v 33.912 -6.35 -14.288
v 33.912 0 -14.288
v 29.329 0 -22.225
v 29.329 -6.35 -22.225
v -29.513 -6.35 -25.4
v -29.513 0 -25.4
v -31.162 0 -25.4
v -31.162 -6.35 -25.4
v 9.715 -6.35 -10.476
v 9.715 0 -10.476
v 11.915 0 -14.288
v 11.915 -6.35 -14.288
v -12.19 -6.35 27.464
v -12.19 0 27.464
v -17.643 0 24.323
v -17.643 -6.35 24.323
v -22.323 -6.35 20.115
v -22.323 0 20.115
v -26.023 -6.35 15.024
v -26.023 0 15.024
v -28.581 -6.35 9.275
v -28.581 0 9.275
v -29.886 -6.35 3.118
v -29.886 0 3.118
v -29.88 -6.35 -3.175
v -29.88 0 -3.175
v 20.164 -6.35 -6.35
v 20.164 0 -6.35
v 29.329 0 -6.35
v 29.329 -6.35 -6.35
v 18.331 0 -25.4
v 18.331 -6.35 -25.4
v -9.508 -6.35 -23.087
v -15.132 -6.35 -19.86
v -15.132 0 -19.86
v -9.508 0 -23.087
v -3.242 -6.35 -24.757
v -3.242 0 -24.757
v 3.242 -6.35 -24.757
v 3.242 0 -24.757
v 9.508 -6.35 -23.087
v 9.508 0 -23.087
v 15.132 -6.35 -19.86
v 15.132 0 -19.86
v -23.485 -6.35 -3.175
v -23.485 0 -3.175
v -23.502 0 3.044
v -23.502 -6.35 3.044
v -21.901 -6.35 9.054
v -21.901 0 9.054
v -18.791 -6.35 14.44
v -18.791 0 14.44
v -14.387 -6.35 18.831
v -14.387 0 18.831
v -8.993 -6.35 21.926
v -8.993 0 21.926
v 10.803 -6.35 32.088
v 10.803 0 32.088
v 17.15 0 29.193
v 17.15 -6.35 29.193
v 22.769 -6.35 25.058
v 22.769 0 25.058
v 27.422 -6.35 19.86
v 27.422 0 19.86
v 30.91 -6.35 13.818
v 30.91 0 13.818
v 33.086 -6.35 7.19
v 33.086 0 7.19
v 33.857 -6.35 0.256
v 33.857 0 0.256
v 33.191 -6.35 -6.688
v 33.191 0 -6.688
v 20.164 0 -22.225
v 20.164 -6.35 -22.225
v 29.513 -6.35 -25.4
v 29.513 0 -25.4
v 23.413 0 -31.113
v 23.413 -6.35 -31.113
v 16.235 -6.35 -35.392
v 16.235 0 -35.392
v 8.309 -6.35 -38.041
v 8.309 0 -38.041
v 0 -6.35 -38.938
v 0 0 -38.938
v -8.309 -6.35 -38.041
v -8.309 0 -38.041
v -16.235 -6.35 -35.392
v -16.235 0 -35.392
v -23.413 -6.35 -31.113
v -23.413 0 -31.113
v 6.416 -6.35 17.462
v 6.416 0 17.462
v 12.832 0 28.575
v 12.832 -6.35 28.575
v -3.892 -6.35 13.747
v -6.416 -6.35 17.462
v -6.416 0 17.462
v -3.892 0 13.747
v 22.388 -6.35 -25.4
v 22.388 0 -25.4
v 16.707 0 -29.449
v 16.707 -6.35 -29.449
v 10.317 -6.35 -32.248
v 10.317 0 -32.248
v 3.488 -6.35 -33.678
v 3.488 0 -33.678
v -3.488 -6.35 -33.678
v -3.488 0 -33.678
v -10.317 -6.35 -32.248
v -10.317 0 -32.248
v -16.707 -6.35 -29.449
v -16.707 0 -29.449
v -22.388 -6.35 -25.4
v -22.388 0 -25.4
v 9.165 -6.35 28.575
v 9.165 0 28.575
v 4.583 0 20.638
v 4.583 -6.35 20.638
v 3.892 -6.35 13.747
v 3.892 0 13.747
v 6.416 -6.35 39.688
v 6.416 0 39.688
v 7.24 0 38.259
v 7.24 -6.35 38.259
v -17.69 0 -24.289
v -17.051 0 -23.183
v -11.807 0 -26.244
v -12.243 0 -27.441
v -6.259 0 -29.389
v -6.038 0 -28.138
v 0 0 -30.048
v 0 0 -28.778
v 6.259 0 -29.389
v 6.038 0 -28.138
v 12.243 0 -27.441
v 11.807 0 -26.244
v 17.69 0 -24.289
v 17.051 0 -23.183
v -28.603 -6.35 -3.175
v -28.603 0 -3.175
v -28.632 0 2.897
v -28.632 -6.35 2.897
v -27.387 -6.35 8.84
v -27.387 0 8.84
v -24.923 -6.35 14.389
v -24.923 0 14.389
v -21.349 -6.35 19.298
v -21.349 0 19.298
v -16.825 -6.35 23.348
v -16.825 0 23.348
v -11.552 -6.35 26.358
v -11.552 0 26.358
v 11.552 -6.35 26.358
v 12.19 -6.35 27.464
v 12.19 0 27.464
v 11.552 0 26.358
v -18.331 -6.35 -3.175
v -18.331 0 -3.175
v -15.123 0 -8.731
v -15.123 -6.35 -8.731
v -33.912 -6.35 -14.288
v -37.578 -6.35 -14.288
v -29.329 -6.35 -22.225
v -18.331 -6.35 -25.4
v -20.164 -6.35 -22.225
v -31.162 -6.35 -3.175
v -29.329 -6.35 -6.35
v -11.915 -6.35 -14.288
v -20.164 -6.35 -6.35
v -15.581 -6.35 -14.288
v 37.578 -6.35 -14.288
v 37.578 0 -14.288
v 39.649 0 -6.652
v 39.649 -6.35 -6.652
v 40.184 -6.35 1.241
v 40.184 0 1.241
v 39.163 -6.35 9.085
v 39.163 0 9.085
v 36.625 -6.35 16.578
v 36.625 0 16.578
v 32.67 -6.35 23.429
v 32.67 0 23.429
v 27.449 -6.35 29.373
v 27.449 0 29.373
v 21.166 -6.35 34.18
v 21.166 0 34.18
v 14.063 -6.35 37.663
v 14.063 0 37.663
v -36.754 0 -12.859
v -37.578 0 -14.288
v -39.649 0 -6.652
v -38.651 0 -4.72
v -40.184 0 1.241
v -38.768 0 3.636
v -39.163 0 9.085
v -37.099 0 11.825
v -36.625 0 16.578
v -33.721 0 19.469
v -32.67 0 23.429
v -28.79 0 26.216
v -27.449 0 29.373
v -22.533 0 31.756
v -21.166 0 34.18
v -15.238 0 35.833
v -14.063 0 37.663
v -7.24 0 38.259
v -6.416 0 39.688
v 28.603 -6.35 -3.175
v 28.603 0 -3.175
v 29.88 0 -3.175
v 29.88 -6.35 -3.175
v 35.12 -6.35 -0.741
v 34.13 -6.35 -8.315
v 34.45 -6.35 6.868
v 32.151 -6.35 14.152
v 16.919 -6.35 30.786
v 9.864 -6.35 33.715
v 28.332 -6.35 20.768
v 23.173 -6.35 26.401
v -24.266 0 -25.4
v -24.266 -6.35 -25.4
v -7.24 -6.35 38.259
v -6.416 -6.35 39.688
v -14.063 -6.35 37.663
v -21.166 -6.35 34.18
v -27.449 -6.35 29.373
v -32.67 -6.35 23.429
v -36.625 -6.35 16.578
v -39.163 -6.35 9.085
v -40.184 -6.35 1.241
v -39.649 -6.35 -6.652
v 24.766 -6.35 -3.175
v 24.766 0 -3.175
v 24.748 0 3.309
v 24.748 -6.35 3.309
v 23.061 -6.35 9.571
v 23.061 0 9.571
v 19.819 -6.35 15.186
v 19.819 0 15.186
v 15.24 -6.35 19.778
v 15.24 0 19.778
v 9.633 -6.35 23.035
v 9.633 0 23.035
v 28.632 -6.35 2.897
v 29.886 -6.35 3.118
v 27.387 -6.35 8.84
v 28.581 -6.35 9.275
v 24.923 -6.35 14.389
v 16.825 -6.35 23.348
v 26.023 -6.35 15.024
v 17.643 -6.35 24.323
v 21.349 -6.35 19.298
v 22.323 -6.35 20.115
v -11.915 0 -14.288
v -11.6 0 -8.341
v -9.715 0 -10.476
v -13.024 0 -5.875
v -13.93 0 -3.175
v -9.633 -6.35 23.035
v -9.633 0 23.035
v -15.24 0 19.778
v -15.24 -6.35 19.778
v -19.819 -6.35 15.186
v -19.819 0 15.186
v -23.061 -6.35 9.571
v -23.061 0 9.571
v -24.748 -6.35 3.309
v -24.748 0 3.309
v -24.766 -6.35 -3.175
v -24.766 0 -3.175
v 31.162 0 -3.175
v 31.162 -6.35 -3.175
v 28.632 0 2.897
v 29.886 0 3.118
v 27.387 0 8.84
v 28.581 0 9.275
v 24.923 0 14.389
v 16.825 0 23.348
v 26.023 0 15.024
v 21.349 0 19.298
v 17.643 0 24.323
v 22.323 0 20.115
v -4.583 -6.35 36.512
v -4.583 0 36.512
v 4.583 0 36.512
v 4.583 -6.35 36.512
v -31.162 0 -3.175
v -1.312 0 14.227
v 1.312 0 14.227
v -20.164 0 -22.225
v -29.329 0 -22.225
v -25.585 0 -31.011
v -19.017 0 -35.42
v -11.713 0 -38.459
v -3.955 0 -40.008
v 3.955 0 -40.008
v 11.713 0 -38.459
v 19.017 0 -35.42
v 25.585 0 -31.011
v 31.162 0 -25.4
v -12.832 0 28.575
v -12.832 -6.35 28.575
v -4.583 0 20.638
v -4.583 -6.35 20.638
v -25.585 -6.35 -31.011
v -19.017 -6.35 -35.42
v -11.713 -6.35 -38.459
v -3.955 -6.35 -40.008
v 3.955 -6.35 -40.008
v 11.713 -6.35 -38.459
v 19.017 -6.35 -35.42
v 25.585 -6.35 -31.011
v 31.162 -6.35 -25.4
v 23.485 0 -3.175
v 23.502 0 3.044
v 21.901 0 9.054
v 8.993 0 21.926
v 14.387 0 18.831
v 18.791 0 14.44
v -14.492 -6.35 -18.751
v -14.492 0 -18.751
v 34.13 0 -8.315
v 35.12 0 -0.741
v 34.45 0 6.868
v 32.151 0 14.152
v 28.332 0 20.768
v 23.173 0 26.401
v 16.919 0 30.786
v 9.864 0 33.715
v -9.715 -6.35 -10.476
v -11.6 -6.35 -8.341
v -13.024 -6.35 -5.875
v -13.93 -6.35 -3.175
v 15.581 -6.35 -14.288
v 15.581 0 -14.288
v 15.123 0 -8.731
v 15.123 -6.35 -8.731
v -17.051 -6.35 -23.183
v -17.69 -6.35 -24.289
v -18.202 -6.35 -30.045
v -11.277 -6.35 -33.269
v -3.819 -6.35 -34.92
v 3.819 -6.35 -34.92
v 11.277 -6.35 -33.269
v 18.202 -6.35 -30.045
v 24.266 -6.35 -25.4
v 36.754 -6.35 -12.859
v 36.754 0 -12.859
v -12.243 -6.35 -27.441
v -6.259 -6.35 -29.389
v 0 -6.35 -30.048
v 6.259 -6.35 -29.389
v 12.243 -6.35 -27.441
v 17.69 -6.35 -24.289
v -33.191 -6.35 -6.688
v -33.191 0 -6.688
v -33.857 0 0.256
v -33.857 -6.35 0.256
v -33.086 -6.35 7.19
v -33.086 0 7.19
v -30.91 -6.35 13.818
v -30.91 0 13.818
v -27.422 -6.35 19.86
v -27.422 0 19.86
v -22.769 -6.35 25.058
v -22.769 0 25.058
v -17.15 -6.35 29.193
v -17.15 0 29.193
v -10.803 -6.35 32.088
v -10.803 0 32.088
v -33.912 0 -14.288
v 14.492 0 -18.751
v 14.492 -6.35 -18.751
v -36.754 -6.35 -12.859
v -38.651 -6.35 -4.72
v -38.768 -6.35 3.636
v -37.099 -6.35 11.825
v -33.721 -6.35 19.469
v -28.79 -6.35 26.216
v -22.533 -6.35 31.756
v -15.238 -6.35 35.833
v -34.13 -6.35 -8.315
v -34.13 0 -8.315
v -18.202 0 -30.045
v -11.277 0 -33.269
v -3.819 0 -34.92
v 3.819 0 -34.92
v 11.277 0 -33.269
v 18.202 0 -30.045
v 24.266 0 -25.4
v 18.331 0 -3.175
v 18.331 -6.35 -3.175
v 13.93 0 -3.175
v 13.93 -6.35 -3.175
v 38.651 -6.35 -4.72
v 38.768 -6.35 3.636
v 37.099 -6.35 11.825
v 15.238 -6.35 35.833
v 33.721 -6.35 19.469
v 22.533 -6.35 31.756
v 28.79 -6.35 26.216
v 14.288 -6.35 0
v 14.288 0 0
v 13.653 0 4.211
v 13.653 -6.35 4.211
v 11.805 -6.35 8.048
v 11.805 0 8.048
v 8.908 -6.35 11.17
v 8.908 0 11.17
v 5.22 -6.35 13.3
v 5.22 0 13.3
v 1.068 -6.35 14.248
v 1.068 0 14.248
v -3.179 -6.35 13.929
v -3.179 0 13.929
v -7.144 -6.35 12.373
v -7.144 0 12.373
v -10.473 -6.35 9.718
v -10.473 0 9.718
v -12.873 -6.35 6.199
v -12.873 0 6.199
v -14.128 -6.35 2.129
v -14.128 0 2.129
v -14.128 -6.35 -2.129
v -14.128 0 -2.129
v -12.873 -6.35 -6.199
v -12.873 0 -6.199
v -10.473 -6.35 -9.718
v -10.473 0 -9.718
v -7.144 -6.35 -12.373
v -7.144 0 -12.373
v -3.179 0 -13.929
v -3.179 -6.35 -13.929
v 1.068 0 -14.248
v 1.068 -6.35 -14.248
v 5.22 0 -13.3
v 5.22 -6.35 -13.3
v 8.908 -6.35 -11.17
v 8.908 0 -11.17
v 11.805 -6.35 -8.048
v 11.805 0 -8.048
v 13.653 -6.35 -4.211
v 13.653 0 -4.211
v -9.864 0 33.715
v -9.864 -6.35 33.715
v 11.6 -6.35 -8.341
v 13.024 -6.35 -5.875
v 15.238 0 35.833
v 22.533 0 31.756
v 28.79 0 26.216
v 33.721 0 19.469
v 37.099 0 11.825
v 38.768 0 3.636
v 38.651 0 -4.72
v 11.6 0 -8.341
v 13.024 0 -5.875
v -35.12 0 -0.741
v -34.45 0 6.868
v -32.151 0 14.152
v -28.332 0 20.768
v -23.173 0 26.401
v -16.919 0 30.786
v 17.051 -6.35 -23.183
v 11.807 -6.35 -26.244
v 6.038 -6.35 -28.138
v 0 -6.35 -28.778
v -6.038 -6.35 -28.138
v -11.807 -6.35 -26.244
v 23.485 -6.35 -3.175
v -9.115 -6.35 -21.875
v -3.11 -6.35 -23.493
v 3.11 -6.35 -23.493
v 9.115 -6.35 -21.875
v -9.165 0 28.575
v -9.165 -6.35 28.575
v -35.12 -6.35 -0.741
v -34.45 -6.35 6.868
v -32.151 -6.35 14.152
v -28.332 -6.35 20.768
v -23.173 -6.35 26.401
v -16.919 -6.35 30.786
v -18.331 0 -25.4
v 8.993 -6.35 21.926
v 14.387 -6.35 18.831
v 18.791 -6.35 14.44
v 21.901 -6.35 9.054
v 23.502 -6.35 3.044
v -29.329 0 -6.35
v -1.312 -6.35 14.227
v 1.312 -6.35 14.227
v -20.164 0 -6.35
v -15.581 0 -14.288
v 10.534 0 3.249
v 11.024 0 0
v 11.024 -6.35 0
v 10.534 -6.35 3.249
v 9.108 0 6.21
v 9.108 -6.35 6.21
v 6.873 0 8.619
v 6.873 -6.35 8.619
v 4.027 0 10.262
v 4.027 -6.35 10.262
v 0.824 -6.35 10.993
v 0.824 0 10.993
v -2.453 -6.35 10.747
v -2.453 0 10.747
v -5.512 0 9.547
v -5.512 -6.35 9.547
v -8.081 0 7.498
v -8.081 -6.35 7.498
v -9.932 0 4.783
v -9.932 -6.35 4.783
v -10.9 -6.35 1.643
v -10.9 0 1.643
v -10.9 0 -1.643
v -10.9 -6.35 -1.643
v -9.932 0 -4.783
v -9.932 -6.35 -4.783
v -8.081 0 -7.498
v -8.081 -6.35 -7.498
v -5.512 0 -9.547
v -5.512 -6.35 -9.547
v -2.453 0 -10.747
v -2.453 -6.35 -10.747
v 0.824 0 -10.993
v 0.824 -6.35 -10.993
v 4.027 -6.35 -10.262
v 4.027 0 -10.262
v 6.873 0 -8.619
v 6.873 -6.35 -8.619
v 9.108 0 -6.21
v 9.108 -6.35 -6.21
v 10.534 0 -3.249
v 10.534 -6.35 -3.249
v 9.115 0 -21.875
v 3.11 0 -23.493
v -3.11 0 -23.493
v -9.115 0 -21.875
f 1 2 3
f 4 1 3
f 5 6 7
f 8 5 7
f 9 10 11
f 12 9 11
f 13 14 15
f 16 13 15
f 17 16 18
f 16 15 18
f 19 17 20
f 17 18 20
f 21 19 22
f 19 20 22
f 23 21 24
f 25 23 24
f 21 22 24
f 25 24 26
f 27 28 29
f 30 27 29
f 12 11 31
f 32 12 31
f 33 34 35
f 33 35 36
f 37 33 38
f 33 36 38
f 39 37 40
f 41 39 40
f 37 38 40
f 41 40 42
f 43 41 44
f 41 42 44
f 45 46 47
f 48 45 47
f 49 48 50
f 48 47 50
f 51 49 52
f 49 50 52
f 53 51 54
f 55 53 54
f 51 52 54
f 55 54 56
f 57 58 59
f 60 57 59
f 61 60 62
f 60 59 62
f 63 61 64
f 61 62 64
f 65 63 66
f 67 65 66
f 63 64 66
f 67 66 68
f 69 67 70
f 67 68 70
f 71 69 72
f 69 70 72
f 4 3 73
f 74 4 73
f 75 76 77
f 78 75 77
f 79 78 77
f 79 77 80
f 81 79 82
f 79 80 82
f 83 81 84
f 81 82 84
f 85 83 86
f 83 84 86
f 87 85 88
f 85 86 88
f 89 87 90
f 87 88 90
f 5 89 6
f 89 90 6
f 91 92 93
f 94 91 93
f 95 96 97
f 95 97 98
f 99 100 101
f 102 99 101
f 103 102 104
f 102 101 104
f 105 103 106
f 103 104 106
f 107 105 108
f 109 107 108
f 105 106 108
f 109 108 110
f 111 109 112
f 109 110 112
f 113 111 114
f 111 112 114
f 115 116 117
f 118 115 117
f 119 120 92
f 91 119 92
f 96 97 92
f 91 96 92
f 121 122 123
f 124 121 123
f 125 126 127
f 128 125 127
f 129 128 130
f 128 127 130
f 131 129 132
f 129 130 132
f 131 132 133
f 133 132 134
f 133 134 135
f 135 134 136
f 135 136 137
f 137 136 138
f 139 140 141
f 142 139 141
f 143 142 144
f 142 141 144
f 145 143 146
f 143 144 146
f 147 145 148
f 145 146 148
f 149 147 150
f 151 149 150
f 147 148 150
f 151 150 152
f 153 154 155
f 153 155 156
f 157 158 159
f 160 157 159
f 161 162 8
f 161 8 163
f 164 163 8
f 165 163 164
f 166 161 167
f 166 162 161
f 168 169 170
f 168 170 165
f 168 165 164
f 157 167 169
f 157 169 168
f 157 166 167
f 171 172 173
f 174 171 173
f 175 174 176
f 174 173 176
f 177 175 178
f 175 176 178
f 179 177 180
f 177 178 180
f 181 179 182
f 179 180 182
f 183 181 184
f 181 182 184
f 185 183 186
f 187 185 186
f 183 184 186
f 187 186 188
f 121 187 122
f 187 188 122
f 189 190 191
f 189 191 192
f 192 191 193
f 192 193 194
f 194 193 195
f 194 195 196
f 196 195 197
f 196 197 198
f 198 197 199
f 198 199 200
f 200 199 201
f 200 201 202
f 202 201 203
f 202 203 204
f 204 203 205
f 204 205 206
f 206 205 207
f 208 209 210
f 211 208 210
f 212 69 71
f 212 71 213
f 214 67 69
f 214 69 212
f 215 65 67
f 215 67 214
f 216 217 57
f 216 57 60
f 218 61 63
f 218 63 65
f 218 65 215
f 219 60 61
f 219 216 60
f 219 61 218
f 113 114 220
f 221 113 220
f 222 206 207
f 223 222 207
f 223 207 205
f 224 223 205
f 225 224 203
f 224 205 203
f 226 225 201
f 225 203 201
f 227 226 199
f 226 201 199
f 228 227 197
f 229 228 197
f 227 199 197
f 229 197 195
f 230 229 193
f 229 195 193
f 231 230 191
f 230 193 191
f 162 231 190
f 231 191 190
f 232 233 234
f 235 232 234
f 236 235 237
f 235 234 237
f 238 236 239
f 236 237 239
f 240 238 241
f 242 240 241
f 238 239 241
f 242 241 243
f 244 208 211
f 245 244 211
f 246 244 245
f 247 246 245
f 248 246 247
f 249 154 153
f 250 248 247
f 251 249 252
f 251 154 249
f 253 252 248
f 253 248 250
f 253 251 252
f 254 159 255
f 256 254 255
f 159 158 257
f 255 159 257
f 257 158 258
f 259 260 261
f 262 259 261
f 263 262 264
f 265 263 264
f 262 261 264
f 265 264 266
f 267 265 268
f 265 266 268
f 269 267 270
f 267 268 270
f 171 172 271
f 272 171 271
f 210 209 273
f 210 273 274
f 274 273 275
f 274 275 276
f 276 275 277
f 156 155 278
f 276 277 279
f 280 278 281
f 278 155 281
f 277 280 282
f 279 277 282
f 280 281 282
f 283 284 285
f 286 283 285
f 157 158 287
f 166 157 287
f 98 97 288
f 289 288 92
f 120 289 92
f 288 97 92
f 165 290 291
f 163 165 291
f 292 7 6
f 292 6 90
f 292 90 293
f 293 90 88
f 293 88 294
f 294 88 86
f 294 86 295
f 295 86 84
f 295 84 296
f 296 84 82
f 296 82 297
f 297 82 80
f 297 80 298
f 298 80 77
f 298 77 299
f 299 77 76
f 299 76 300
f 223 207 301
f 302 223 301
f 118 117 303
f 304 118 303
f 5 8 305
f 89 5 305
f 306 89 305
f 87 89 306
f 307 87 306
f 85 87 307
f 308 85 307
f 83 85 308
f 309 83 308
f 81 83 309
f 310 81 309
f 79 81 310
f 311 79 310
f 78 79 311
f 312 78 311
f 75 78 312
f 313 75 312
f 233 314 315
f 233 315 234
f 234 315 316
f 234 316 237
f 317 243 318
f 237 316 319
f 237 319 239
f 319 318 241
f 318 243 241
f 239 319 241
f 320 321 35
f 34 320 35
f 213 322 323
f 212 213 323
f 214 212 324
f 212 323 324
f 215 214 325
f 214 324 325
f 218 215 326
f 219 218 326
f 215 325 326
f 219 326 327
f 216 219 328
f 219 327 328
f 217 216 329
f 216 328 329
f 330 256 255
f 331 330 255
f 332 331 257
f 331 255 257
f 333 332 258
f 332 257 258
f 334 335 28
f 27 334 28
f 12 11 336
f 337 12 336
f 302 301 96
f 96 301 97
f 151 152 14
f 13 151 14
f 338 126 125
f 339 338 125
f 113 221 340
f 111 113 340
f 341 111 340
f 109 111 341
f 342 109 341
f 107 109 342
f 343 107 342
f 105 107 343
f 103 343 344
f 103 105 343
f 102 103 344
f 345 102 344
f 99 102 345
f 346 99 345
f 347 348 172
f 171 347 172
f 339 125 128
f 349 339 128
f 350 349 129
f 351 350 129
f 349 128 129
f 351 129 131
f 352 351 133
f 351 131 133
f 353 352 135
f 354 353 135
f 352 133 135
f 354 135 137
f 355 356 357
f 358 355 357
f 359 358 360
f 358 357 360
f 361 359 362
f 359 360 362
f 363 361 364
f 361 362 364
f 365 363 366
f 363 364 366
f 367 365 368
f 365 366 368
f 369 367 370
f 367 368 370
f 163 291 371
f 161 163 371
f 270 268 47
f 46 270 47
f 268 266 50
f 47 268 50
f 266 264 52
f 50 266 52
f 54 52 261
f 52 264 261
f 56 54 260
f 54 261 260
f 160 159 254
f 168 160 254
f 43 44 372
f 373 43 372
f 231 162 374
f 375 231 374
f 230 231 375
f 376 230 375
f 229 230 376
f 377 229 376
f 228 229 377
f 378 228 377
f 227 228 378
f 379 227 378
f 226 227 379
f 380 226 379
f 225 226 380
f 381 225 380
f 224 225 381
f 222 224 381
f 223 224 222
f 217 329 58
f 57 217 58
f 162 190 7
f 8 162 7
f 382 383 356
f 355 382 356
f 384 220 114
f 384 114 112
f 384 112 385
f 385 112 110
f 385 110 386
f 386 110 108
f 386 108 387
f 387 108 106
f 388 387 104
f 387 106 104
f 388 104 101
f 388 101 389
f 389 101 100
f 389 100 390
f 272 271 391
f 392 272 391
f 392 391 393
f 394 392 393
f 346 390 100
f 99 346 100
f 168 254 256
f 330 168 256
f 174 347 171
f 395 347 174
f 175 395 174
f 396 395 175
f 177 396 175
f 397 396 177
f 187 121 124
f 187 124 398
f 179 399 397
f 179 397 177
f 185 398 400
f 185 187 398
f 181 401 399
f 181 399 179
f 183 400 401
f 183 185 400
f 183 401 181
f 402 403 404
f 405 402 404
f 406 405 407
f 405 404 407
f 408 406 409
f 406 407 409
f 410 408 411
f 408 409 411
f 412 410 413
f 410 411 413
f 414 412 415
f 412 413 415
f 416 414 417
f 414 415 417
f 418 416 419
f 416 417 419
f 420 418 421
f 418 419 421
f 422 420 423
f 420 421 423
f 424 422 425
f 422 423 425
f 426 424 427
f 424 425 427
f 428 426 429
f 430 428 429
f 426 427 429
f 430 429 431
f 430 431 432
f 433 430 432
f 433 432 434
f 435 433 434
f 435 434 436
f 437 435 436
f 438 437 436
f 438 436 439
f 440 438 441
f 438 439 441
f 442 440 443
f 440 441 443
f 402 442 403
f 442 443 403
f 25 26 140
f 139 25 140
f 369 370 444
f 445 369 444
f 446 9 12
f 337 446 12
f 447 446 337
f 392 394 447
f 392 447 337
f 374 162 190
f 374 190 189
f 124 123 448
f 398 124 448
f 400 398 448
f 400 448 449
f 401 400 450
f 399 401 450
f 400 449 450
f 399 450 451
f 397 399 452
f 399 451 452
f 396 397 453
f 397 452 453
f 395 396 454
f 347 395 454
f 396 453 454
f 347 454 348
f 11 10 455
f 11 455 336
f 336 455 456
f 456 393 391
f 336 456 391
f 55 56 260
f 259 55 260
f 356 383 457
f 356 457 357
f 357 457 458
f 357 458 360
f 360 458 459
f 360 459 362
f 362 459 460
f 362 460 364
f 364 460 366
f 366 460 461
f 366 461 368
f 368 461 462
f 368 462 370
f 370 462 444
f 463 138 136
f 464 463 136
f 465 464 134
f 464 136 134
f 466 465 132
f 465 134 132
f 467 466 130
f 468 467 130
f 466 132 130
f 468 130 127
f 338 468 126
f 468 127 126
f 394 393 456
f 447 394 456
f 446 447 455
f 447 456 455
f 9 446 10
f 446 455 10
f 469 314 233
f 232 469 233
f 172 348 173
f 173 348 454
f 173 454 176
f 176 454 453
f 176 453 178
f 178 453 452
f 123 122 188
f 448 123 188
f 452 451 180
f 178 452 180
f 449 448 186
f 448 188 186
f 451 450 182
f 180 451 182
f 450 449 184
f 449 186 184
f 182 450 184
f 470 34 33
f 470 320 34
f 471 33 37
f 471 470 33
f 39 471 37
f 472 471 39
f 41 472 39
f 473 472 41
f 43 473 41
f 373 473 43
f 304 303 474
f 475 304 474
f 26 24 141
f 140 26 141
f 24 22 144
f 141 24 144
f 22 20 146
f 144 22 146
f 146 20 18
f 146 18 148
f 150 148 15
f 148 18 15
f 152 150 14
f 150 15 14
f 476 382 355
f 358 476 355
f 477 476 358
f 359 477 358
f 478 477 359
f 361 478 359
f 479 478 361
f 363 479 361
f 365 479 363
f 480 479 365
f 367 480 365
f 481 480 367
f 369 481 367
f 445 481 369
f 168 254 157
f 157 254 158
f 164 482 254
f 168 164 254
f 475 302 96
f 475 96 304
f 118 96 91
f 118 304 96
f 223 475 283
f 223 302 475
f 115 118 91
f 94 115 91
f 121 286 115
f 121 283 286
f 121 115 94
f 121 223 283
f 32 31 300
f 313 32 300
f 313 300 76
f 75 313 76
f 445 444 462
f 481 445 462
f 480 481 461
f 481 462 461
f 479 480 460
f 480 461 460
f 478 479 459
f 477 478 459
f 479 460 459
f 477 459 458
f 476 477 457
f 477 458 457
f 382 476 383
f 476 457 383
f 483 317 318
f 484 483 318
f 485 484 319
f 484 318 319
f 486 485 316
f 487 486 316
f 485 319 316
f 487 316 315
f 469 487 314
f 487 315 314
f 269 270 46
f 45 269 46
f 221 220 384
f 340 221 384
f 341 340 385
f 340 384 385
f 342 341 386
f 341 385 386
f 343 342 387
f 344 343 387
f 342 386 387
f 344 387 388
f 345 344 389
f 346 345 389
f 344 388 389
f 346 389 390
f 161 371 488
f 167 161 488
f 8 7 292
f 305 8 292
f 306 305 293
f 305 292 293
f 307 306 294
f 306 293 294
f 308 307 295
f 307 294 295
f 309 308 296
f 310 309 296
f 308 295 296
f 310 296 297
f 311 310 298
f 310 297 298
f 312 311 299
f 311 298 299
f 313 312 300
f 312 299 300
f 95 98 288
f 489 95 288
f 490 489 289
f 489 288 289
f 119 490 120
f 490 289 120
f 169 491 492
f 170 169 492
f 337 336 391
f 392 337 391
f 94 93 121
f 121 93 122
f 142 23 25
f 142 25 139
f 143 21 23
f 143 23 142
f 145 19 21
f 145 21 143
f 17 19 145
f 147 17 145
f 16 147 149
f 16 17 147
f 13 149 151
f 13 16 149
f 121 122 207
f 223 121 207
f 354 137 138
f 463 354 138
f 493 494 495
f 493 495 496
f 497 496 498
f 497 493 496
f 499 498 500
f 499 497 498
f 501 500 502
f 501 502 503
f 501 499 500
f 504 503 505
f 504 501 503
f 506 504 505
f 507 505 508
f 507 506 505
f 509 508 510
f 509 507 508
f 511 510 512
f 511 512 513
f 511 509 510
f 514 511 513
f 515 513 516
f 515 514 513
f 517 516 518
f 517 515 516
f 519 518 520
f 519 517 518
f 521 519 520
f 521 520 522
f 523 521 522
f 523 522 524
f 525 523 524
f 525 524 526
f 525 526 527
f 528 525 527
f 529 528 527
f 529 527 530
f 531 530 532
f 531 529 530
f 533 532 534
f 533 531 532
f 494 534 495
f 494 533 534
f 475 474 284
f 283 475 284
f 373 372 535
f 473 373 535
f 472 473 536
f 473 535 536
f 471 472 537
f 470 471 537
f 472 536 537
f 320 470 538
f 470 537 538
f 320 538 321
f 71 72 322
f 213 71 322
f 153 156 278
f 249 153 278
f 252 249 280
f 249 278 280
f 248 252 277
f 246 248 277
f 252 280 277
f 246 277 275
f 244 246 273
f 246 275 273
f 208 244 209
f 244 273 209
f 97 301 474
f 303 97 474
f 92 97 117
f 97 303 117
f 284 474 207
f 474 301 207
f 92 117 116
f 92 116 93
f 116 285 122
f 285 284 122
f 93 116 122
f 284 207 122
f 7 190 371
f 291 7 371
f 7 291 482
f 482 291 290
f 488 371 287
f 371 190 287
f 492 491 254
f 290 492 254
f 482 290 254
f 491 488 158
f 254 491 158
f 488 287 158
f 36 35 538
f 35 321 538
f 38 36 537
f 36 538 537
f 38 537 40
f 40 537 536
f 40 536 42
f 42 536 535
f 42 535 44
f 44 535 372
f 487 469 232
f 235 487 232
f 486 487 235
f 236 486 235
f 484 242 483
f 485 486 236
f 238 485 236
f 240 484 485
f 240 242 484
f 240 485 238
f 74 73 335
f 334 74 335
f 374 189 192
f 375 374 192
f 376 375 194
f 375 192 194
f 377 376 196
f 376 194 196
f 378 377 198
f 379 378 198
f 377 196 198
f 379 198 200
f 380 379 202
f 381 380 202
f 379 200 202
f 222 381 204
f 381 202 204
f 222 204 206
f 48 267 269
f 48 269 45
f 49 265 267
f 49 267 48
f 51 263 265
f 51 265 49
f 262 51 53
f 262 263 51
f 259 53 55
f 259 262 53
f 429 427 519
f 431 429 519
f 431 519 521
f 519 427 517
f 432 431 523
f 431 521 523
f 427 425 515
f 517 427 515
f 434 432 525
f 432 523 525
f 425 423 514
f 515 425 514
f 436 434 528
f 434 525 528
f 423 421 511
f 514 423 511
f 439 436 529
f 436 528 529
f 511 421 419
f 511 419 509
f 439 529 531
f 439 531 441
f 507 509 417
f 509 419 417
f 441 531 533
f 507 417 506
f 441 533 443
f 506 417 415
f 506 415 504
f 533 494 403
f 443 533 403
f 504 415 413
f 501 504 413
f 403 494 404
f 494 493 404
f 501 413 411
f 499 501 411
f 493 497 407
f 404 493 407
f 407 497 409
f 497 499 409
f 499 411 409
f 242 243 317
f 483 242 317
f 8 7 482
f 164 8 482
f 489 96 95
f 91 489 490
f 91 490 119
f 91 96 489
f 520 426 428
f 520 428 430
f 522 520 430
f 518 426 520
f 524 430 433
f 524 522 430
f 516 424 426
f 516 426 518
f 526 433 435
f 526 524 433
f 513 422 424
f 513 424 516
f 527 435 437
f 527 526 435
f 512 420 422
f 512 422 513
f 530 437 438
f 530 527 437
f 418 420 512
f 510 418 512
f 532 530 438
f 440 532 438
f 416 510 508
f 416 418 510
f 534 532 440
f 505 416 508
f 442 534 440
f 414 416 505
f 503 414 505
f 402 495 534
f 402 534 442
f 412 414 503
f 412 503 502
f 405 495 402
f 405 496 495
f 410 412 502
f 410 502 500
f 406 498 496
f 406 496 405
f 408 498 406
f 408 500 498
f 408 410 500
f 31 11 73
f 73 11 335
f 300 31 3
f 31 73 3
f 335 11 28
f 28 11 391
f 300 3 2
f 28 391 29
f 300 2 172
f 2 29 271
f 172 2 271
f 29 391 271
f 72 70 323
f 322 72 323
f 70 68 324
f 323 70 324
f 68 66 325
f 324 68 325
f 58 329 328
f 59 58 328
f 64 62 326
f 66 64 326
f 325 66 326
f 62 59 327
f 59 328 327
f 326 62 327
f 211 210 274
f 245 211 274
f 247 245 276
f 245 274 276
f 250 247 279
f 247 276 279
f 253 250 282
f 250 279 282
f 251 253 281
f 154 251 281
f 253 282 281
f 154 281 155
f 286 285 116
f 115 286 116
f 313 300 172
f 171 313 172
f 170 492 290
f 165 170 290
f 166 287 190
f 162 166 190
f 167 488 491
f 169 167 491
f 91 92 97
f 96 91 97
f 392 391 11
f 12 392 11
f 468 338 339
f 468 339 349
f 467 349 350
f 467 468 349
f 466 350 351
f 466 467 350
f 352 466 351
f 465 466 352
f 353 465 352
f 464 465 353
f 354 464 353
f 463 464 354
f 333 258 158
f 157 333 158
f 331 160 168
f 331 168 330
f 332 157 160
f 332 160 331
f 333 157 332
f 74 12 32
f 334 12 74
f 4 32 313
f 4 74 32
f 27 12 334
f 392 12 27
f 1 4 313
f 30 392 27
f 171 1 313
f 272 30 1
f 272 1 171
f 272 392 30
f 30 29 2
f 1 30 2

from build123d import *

# Parameters (mm, degrees)
F0_R     = 14.2875
F0_R_2   = 11.0236
F2_DEPTH = 6.35


# Not quite as in the source:
# - ends of sketch curves that miss each other by under 0.0002 mm in the source are joined


with BuildPart() as f2:
    # F0 (on Front) → F2 (new body)
    with BuildSketch(Plane.XZ):
        Circle(F0_R)
        Circle(F0_R_2, mode=Mode.SUBTRACT)
    extrude(amount=F2_DEPTH)


with BuildPart() as f2b:
    # F0 (on Front) → F2, piece 2 (new body)
    with BuildSketch(Plane.XZ):
        Polygon((-6.4158048664, 17.4625), (6.4158048664, 17.4625), (12.8316097327, 28.575), (6.4158048664, 39.6875), (-6.4158048664, 39.6875), (-12.8316097327, 28.575), align=None)
        Polygon((9.1654355234, 28.575), (4.5827177617, 20.6375), (-4.5827177617, 20.6375), (-9.1654355234, 28.575), (-4.5827177617, 36.5125), (4.5827177617, 36.5125), align=None, mode=Mode.SUBTRACT)
    extrude(amount=F2_DEPTH)


with BuildPart() as f2c:
    # F0 (on Front) → F2, piece 3 (new body)
    with BuildSketch(Plane.XZ):
        Polygon((-31.1624807795, -25.4), (-18.3308710468, -25.4), (-11.9150661804, -14.2875), (-18.3308710468, -3.175), (-31.1624807795, -3.175), (-37.5782856459, -14.2875), align=None)
        Polygon((-33.9121114365, -14.2875), (-29.3293936748, -6.35), (-20.1639581514, -6.35), (-15.5812403898, -14.2875), (-20.1639581514, -22.225), (-29.3293936748, -22.225), align=None, mode=Mode.SUBTRACT)
    extrude(amount=F2_DEPTH)


with BuildPart() as f2d:
    # F0 (on Front) → F2, piece 4 (new body)
    with BuildSketch(Plane.XZ):
        Polygon((37.5782856459, -14.2875), (31.1624807795, -3.175), (18.3308710468, -3.175), (11.9150661804, -14.2875), (18.3308710468, -25.4), (31.1624807795, -25.4), align=None)
        Polygon((29.3293936748, -22.225), (20.1639581514, -22.225), (15.5812403898, -14.2875), (20.1639581514, -6.35), (29.3293936748, -6.35), (33.9121114365, -14.2875), align=None, mode=Mode.SUBTRACT)
    extrude(amount=F2_DEPTH)


with BuildPart() as f2e:
    # F1 (on Front) → F2, piece 5 (new body)
    with BuildSketch(Plane.XZ):
        with BuildLine():
            ThreePointArc((-36.7535982008, -12.8590994448), (-33.7214703776, 19.4691), (-7.2404923114, 38.2590994448))
            Line((-7.2404923114, 38.2590994448), (-6.4158048664, 39.6875))
            ThreePointArc((-6.4158048664, 39.6875), (-34.8165931166, 20.1013694082), (-37.5782856459, -14.2875))
            Line((-37.5782856459, -14.2875), (-36.7535982008, -12.8590994448))
        make_face()
    extrude(amount=F2_DEPTH)


with BuildPart() as f2f:
    # F1 (on Front) → F2, piece 6 (new body)
    with BuildSketch(Plane.XZ):
        with BuildLine():
            Line((-10.8030992669, 32.0884831905), (-9.8641309809, 33.7148239686))
            ThreePointArc((-9.8641309809, 33.7148239686), (-30.4219135892, 17.5641), (-34.1299595314, -8.3148239686))
            Line((-34.1299595314, -8.3148239686), (-33.1909912454, -6.6884831905))
            ThreePointArc((-33.1909912454, -6.6884831905), (-29.3220613264, 16.9291), (-10.8030992669, 32.0884831905))
        make_face()
    extrude(amount=F2_DEPTH)


with BuildPart() as f2g:
    # F1 (on Front) → F2, piece 7 (new body)
    with BuildSketch(Plane.XZ):
        with BuildLine():
            ThreePointArc((-9.6331085014, 23.0350652667), (-21.6230914657, 12.4841069647), (-24.7655079948, -3.175))
            Line((-24.7655079948, -3.175), (-23.4845493514, -3.175))
            ThreePointArc((-23.4845493514, -3.175), (-20.523243224, 11.8491), (-8.9926440187, 21.9257163348))
            Line((-8.9926440187, 21.9257163348), (-9.6331085014, 23.0350652667))
        make_face()
    extrude(amount=F2_DEPTH)


with BuildPart() as f2h:
    # F1 (on Front) → F2, piece 8 (new body)
    with BuildSketch(Plane.XZ):
        with BuildLine():
            ThreePointArc((-28.6025203477, -3.175), (-24.9226522752, 14.3891), (-11.5516295168, 26.3580092334))
            Line((-11.5516295168, 26.3580092334), (-12.1903634715, 27.4643288954))
            ThreePointArc((-12.1903634715, 27.4643288954), (-26.022504538, 15.0241), (-29.879988257, -3.175))
            Line((-29.879988257, -3.175), (-28.6025203477, -3.175))
        make_face()
    extrude(amount=F2_DEPTH)


with BuildPart() as f2i:
    # F1 (on Front) → F2, piece 9 (new body)
    with BuildSketch(Plane.XZ):
        with BuildLine():
            ThreePointArc((-15.132397448, -19.860049313), (-8.0421e-06, -24.9682), (15.1323846544, -19.8600590611))
            Line((15.1323846544, -19.8600590611), (14.4919053327, -18.7507163348))
            ThreePointArc((14.4919053327, -18.7507163348), (0, -23.6982), (-14.4919053327, -18.7507163348))
            Line((-14.4919053327, -18.7507163348), (-15.132397448, -19.860049313))
        make_face()
    extrude(amount=F2_DEPTH)


with BuildPart() as f2j:
    # F1 (on Front) → F2, piece 10 (new body)
    with BuildSketch(Plane.XZ):
        with BuildLine():
            Line((17.6896247855, -24.2893288954), (17.0508908309, -23.1830092334))
            ThreePointArc((17.0508908309, -23.1830092334), (0, -28.7782), (-17.0508908309, -23.1830092334))
            Line((-17.0508908309, -23.1830092334), (-17.6896247855, -24.2893288954))
            ThreePointArc((-17.6896247855, -24.2893288954), (0, -30.0482), (17.6896247855, -24.2893288954))
        make_face()
    extrude(amount=F2_DEPTH)


with BuildPart() as f2k:
    # F1 (on Front) → F2, piece 11 (new body)
    with BuildSketch(Plane.XZ):
        with BuildLine():
            Line((-29.5131058894, -25.4), (-31.1624807795, -25.4))
            ThreePointArc((-31.1624807795, -25.4), (0, -40.2027388163), (31.1624807795, -25.4))
            Line((31.1624807795, -25.4), (29.5131058894, -25.4))
            ThreePointArc((29.5131058894, -25.4), (0, -38.9382), (-29.5131058894, -25.4))
        make_face()
    extrude(amount=F2_DEPTH)


with BuildPart() as f2l:
    # F1 (on Front) → F2, piece 12 (new body)
    with BuildSketch(Plane.XZ):
        with BuildLine():
            Line((-22.3878919785, -25.4), (-24.2658285505, -25.4))
            ThreePointArc((-24.2658285505, -25.4), (0, -35.1282), (24.2658285505, -25.4))
            Line((24.2658285505, -25.4), (22.3878919785, -25.4))
            ThreePointArc((22.3878919785, -25.4), (0, -33.8582), (-22.3878919785, -25.4))
        make_face()
    extrude(amount=F2_DEPTH)


with BuildPart() as f2m:
    # F1 (on Front) → F2, piece 13 (new body)
    with BuildSketch(Plane.XZ):
        with BuildLine():
            Line((9.6331233404, 23.0350590611), (8.9926440187, 21.9257163348))
            ThreePointArc((8.9926440187, 21.9257163348), (20.523243224, 11.8491), (23.4845493514, -3.175))
            Line((23.4845493514, -3.175), (24.7655059495, -3.175))
            ThreePointArc((24.7655059495, -3.175), (21.6230995078, 12.4840930353), (9.6331233404, 23.0350590611))
        make_face()
    extrude(amount=F2_DEPTH)


with BuildPart() as f2n:
    # F1 (on Front) → F2, piece 14 (new body)
    with BuildSketch(Plane.XZ):
        with BuildLine():
            Line((12.1903634715, 27.4643288954), (11.5516295168, 26.3580092334))
            ThreePointArc((11.5516295168, 26.3580092334), (24.9226522752, 14.3891), (28.6025203477, -3.175))
            Line((28.6025203477, -3.175), (29.879988257, -3.175))
            ThreePointArc((29.879988257, -3.175), (26.022504538, 15.0241), (12.1903634715, 27.4643288954))
        make_face()
    extrude(amount=F2_DEPTH)


with BuildPart() as f2o:
    # F1 (on Front) → F2, piece 15 (new body)
    with BuildSketch(Plane.XZ):
        with BuildLine():
            ThreePointArc((34.1299595314, -8.3148239686), (30.4219135892, 17.5641), (9.8641309809, 33.7148239686))
            Line((9.8641309809, 33.7148239686), (10.8030992669, 32.0884831905))
            ThreePointArc((10.8030992669, 32.0884831905), (29.3220613264, 16.9291), (33.1909912454, -6.6884831905))
            Line((33.1909912454, -6.6884831905), (34.1299595314, -8.3148239686))
        make_face()
    extrude(amount=F2_DEPTH)


with BuildPart() as f2p:
    # F1 (on Front) → F2, piece 16 (new body)
    with BuildSketch(Plane.XZ):
        with BuildLine():
            ThreePointArc((37.5782856459, -14.2875), (34.8165931166, 20.1013694082), (6.4158048664, 39.6875))
            Line((6.4158048664, 39.6875), (7.2404923114, 38.2590994448))
            ThreePointArc((7.2404923114, 38.2590994448), (33.7214703776, 19.4691), (36.7535982008, -12.8590994448))
            Line((36.7535982008, -12.8590994448), (37.5782856459, -14.2875))
        make_face()
    extrude(amount=F2_DEPTH)


with BuildPart() as f2q:
    # F1 (on Front) → F2, piece 17 (new body)
    with BuildSketch(Plane.XZ):
        with BuildLine():
            Line((15.1229684123, -8.7312503486), (18.3308710468, -3.175))
            Line((18.3308710468, -3.175), (13.930255965, -3.175))
            ThreePointArc((13.930255965, -3.175), (12.3733379566, -7.14375), (9.7147586395, -10.4764555469))
            Line((9.7147586395, -10.4764555469), (11.9150661804, -14.2875))
            Line((11.9150661804, -14.2875), (15.1229684123, -8.7312503486))
        make_face()
    extrude(amount=F2_DEPTH)


with BuildPart() as f2r:
    # F1 (on Front) → F2, piece 18 (new body)
    with BuildSketch(Plane.XZ):
        with BuildLine():
            Line((3.8920739769, 13.7471603034), (6.4158048664, 17.4625))
            Line((6.4158048664, 17.4625), (0, 17.4625))
            Line((0, 17.4625), (-6.4158048664, 17.4625))
            Line((-6.4158048664, 17.4625), (-3.8920739769, 13.7471603034))
            ThreePointArc((-3.8920739769, 13.7471603034), (0, 14.2875), (3.8920739769, 13.7471603034))
        make_face()
    extrude(amount=F2_DEPTH)


with BuildPart() as f2s:
    # F1 (on Front) → F2, piece 19 (new body)
    with BuildSketch(Plane.XZ):
        with BuildLine():
            ThreePointArc((-9.7147586395, -10.4764555469), (-12.3733379566, -7.14375), (-13.930255965, -3.175))
            Line((-13.930255965, -3.175), (-18.3308710468, -3.175))
            Line((-18.3308710468, -3.175), (-15.1229686466, -8.7312499429))
            Line((-15.1229686466, -8.7312499429), (-11.9150661804, -14.2875))
            Line((-11.9150661804, -14.2875), (-9.7147586395, -10.4764555469))
        make_face()
    extrude(amount=F2_DEPTH)


solid = Compound([f2.part, f2b.part, f2c.part, f2d.part, f2e.part, f2f.part, f2g.part, f2h.part, f2i.part, f2j.part, f2k.part, f2l.part, f2m.part, f2n.part, f2o.part, f2p.part, f2q.part, f2r.part, f2s.part])
